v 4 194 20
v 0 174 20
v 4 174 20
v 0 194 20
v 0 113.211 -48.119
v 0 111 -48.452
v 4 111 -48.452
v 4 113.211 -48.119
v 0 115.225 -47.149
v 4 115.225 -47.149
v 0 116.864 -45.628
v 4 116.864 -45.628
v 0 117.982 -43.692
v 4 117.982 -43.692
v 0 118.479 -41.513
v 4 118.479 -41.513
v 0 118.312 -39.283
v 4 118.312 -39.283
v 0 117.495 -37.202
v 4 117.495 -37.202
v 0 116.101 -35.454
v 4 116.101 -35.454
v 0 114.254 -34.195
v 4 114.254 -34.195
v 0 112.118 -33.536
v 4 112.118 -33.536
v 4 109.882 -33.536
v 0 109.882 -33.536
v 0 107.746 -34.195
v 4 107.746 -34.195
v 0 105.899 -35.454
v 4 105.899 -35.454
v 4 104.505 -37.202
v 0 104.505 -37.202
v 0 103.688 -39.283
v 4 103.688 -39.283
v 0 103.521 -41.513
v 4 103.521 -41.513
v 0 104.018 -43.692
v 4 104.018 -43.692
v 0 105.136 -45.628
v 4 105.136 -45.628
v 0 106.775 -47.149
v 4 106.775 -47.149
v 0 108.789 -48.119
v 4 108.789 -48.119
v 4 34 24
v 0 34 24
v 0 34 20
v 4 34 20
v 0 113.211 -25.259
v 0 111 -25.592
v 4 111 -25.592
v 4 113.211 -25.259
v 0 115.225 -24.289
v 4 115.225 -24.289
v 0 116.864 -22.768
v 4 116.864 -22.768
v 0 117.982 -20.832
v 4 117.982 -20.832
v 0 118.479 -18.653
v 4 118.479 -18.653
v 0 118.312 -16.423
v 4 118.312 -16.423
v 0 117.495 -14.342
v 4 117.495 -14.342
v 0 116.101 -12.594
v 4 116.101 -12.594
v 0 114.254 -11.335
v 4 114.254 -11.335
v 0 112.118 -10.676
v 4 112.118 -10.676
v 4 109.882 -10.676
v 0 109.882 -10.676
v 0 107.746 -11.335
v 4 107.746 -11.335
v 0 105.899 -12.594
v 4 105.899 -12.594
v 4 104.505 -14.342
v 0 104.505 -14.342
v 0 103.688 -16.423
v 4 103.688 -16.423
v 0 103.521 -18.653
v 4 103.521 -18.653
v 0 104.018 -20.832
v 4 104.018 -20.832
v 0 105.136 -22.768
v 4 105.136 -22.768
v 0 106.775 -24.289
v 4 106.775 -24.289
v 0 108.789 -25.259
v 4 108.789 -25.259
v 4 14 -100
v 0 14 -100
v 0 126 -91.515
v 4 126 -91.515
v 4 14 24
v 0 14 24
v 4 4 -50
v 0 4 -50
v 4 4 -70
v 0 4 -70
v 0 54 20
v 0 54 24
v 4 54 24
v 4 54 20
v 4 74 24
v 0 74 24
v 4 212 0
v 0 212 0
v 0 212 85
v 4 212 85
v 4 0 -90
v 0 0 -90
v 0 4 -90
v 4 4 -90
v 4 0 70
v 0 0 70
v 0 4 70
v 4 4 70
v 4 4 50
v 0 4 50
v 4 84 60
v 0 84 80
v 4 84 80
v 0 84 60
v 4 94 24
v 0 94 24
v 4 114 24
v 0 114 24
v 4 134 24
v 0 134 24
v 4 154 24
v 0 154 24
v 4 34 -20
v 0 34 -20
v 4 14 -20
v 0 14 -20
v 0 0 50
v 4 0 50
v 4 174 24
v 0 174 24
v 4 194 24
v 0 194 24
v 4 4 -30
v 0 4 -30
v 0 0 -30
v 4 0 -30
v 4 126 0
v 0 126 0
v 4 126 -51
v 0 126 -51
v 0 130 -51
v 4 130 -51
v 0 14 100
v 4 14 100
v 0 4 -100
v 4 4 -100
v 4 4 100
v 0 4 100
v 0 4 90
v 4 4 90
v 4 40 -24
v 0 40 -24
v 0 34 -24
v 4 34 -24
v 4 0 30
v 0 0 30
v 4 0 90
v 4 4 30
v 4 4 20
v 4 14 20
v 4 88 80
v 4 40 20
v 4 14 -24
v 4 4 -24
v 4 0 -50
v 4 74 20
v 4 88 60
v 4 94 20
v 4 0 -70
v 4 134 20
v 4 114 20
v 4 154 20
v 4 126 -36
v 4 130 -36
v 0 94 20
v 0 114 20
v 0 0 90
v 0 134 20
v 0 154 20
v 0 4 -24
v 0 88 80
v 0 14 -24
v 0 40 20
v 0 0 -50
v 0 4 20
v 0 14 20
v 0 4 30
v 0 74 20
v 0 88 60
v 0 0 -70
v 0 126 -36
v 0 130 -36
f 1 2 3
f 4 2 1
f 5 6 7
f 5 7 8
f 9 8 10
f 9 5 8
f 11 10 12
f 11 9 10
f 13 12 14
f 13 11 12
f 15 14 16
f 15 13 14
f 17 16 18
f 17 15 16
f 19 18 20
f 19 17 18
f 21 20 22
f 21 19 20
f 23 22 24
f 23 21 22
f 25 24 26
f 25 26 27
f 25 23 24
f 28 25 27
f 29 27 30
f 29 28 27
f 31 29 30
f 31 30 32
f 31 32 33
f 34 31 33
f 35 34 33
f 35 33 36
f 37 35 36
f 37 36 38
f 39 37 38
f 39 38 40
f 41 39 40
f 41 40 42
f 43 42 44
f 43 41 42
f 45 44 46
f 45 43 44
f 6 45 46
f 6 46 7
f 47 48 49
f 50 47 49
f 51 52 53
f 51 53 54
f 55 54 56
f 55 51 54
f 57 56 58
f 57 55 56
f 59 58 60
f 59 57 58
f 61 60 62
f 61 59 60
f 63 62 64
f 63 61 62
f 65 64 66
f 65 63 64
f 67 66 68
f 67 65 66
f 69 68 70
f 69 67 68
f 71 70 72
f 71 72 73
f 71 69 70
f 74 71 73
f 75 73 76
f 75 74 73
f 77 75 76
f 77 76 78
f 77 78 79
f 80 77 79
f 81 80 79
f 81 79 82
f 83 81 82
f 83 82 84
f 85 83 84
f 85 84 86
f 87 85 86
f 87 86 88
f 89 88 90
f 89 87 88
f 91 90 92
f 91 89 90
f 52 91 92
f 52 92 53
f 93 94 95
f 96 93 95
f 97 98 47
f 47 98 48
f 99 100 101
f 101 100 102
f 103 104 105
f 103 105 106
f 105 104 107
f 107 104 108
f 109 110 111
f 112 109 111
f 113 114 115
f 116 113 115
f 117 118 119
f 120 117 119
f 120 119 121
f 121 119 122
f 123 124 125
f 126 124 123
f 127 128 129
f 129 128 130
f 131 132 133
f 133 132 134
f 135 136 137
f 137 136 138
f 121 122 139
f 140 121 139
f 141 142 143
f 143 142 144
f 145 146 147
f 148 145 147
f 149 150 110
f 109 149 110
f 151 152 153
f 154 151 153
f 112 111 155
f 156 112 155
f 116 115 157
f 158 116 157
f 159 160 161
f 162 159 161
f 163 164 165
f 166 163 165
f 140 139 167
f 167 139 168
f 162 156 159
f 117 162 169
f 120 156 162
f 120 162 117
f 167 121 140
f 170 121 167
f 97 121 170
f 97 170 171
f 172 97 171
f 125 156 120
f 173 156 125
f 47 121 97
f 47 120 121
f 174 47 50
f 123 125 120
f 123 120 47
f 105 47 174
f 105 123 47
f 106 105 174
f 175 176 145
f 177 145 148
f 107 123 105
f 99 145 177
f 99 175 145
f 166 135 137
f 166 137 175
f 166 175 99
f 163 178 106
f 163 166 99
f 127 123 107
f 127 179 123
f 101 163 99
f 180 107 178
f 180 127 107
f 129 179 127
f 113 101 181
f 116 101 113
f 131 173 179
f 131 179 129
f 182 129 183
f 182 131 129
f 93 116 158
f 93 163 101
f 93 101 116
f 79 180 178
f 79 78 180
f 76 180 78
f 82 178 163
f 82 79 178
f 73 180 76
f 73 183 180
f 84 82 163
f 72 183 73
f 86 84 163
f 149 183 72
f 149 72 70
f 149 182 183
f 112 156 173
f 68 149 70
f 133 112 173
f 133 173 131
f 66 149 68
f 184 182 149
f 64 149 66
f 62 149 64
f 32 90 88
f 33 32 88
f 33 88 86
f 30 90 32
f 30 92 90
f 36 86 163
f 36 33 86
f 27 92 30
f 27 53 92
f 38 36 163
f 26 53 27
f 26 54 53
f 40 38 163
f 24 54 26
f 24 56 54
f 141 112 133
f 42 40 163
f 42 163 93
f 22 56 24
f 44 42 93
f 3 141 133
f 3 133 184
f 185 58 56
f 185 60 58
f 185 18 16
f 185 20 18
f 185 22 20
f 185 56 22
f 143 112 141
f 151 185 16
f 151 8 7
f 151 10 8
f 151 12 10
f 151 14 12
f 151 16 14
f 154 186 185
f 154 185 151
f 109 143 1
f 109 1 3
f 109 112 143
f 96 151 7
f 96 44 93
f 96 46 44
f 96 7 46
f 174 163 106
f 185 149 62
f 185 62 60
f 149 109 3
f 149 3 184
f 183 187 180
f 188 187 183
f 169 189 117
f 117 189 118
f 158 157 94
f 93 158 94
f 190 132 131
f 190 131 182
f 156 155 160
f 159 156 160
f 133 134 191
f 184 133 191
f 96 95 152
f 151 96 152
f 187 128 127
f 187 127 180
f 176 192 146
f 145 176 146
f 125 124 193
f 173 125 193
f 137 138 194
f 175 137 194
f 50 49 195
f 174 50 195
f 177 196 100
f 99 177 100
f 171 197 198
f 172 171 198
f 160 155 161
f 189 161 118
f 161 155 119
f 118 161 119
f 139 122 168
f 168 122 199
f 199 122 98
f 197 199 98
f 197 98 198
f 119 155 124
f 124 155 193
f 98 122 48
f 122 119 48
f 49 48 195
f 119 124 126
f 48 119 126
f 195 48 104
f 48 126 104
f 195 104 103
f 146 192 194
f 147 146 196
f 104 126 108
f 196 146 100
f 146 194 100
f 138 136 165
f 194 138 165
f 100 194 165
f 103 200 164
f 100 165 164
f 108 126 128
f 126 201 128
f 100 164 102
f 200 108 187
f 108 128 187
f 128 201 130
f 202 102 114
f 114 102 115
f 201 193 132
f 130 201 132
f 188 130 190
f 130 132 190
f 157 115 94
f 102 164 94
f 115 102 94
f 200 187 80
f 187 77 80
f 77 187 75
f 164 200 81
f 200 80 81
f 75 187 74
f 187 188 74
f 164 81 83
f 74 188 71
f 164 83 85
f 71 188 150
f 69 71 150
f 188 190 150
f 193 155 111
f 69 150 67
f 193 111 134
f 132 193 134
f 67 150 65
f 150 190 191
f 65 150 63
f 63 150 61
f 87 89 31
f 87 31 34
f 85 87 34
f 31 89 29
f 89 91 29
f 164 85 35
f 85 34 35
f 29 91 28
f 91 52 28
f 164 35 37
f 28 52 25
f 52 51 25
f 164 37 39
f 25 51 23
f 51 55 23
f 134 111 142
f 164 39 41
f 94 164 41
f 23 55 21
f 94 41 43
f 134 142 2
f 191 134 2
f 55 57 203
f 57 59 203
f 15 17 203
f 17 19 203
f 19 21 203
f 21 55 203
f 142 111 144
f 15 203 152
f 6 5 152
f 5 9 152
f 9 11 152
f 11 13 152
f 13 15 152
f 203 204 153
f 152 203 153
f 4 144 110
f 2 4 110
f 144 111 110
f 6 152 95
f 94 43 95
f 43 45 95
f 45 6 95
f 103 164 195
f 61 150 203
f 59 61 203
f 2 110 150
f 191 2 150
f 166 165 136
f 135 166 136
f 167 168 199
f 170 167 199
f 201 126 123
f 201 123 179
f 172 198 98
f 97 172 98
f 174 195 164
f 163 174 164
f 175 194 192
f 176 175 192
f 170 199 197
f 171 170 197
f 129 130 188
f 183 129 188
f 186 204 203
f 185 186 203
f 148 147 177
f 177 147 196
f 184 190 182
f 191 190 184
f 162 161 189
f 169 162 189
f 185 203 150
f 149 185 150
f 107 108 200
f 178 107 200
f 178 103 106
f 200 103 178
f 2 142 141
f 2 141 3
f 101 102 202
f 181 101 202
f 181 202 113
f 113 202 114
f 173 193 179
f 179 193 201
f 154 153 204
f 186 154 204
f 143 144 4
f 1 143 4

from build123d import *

# Parameters (mm, degrees)
SKICA1_W                = 20
SKICA1_H                = 4
SKICA1_W_2              = 4
SKICA1_H_2              = 20
SKICA1_R                = 7.5
P_IDAT_VYSUNUT_M1_DEPTH = 4


with BuildPart() as part:
    # Skica1 → Přidat vysunutím1 (new body)
    with BuildSketch(Plane(origin=(0, 0, 0), x_dir=(0, 0, -1), z_dir=(1, 0, 0))):
        Polygon((-20, 40), (24, 40), (24, 34), (20, 34), (20, 14), (24, 14), (24, 4), (30, 4), (30, 0), (50, 0), (50, 4), (70, 4), (70, 0), (90, 0), (90, 4), (100, 4), (100, 14), (91.515151515, 126), (51, 126), (51, 130), (36, 130), (36, 126), (0, 126), (0, 212), (-85, 212), (-100, 14), (-100, 4), (-90, 4), (-90, 0), (-70, 0), (-70, 4), (-50, 4), (-50, 0), (-30, 0), (-30, 4), (-20, 4), (-20, 14), (-24, 14), (-24, 34), (-20, 34), align=None)
        with Locations((-70, 86)):
            Rectangle(SKICA1_W, SKICA1_H, mode=Mode.SUBTRACT)
        with Locations((-22, 64)):
            Rectangle(SKICA1_W_2, SKICA1_H_2, mode=Mode.SUBTRACT)
        with Locations((-22, 104)):
            Rectangle(SKICA1_W_2, SKICA1_H_2, mode=Mode.SUBTRACT)
        with Locations((-22, 144)):
            Rectangle(SKICA1_W_2, SKICA1_H_2, mode=Mode.SUBTRACT)
        with Locations((-22, 184)):
            Rectangle(SKICA1_W_2, SKICA1_H_2, mode=Mode.SUBTRACT)
        with Locations((40.95225545, 111)):
            Circle(SKICA1_R, mode=Mode.SUBTRACT)
        with Locations((18.09225545, 111)):
            Circle(SKICA1_R, mode=Mode.SUBTRACT)
    extrude(amount=P_IDAT_VYSUNUT_M1_DEPTH)


solid = part.part
